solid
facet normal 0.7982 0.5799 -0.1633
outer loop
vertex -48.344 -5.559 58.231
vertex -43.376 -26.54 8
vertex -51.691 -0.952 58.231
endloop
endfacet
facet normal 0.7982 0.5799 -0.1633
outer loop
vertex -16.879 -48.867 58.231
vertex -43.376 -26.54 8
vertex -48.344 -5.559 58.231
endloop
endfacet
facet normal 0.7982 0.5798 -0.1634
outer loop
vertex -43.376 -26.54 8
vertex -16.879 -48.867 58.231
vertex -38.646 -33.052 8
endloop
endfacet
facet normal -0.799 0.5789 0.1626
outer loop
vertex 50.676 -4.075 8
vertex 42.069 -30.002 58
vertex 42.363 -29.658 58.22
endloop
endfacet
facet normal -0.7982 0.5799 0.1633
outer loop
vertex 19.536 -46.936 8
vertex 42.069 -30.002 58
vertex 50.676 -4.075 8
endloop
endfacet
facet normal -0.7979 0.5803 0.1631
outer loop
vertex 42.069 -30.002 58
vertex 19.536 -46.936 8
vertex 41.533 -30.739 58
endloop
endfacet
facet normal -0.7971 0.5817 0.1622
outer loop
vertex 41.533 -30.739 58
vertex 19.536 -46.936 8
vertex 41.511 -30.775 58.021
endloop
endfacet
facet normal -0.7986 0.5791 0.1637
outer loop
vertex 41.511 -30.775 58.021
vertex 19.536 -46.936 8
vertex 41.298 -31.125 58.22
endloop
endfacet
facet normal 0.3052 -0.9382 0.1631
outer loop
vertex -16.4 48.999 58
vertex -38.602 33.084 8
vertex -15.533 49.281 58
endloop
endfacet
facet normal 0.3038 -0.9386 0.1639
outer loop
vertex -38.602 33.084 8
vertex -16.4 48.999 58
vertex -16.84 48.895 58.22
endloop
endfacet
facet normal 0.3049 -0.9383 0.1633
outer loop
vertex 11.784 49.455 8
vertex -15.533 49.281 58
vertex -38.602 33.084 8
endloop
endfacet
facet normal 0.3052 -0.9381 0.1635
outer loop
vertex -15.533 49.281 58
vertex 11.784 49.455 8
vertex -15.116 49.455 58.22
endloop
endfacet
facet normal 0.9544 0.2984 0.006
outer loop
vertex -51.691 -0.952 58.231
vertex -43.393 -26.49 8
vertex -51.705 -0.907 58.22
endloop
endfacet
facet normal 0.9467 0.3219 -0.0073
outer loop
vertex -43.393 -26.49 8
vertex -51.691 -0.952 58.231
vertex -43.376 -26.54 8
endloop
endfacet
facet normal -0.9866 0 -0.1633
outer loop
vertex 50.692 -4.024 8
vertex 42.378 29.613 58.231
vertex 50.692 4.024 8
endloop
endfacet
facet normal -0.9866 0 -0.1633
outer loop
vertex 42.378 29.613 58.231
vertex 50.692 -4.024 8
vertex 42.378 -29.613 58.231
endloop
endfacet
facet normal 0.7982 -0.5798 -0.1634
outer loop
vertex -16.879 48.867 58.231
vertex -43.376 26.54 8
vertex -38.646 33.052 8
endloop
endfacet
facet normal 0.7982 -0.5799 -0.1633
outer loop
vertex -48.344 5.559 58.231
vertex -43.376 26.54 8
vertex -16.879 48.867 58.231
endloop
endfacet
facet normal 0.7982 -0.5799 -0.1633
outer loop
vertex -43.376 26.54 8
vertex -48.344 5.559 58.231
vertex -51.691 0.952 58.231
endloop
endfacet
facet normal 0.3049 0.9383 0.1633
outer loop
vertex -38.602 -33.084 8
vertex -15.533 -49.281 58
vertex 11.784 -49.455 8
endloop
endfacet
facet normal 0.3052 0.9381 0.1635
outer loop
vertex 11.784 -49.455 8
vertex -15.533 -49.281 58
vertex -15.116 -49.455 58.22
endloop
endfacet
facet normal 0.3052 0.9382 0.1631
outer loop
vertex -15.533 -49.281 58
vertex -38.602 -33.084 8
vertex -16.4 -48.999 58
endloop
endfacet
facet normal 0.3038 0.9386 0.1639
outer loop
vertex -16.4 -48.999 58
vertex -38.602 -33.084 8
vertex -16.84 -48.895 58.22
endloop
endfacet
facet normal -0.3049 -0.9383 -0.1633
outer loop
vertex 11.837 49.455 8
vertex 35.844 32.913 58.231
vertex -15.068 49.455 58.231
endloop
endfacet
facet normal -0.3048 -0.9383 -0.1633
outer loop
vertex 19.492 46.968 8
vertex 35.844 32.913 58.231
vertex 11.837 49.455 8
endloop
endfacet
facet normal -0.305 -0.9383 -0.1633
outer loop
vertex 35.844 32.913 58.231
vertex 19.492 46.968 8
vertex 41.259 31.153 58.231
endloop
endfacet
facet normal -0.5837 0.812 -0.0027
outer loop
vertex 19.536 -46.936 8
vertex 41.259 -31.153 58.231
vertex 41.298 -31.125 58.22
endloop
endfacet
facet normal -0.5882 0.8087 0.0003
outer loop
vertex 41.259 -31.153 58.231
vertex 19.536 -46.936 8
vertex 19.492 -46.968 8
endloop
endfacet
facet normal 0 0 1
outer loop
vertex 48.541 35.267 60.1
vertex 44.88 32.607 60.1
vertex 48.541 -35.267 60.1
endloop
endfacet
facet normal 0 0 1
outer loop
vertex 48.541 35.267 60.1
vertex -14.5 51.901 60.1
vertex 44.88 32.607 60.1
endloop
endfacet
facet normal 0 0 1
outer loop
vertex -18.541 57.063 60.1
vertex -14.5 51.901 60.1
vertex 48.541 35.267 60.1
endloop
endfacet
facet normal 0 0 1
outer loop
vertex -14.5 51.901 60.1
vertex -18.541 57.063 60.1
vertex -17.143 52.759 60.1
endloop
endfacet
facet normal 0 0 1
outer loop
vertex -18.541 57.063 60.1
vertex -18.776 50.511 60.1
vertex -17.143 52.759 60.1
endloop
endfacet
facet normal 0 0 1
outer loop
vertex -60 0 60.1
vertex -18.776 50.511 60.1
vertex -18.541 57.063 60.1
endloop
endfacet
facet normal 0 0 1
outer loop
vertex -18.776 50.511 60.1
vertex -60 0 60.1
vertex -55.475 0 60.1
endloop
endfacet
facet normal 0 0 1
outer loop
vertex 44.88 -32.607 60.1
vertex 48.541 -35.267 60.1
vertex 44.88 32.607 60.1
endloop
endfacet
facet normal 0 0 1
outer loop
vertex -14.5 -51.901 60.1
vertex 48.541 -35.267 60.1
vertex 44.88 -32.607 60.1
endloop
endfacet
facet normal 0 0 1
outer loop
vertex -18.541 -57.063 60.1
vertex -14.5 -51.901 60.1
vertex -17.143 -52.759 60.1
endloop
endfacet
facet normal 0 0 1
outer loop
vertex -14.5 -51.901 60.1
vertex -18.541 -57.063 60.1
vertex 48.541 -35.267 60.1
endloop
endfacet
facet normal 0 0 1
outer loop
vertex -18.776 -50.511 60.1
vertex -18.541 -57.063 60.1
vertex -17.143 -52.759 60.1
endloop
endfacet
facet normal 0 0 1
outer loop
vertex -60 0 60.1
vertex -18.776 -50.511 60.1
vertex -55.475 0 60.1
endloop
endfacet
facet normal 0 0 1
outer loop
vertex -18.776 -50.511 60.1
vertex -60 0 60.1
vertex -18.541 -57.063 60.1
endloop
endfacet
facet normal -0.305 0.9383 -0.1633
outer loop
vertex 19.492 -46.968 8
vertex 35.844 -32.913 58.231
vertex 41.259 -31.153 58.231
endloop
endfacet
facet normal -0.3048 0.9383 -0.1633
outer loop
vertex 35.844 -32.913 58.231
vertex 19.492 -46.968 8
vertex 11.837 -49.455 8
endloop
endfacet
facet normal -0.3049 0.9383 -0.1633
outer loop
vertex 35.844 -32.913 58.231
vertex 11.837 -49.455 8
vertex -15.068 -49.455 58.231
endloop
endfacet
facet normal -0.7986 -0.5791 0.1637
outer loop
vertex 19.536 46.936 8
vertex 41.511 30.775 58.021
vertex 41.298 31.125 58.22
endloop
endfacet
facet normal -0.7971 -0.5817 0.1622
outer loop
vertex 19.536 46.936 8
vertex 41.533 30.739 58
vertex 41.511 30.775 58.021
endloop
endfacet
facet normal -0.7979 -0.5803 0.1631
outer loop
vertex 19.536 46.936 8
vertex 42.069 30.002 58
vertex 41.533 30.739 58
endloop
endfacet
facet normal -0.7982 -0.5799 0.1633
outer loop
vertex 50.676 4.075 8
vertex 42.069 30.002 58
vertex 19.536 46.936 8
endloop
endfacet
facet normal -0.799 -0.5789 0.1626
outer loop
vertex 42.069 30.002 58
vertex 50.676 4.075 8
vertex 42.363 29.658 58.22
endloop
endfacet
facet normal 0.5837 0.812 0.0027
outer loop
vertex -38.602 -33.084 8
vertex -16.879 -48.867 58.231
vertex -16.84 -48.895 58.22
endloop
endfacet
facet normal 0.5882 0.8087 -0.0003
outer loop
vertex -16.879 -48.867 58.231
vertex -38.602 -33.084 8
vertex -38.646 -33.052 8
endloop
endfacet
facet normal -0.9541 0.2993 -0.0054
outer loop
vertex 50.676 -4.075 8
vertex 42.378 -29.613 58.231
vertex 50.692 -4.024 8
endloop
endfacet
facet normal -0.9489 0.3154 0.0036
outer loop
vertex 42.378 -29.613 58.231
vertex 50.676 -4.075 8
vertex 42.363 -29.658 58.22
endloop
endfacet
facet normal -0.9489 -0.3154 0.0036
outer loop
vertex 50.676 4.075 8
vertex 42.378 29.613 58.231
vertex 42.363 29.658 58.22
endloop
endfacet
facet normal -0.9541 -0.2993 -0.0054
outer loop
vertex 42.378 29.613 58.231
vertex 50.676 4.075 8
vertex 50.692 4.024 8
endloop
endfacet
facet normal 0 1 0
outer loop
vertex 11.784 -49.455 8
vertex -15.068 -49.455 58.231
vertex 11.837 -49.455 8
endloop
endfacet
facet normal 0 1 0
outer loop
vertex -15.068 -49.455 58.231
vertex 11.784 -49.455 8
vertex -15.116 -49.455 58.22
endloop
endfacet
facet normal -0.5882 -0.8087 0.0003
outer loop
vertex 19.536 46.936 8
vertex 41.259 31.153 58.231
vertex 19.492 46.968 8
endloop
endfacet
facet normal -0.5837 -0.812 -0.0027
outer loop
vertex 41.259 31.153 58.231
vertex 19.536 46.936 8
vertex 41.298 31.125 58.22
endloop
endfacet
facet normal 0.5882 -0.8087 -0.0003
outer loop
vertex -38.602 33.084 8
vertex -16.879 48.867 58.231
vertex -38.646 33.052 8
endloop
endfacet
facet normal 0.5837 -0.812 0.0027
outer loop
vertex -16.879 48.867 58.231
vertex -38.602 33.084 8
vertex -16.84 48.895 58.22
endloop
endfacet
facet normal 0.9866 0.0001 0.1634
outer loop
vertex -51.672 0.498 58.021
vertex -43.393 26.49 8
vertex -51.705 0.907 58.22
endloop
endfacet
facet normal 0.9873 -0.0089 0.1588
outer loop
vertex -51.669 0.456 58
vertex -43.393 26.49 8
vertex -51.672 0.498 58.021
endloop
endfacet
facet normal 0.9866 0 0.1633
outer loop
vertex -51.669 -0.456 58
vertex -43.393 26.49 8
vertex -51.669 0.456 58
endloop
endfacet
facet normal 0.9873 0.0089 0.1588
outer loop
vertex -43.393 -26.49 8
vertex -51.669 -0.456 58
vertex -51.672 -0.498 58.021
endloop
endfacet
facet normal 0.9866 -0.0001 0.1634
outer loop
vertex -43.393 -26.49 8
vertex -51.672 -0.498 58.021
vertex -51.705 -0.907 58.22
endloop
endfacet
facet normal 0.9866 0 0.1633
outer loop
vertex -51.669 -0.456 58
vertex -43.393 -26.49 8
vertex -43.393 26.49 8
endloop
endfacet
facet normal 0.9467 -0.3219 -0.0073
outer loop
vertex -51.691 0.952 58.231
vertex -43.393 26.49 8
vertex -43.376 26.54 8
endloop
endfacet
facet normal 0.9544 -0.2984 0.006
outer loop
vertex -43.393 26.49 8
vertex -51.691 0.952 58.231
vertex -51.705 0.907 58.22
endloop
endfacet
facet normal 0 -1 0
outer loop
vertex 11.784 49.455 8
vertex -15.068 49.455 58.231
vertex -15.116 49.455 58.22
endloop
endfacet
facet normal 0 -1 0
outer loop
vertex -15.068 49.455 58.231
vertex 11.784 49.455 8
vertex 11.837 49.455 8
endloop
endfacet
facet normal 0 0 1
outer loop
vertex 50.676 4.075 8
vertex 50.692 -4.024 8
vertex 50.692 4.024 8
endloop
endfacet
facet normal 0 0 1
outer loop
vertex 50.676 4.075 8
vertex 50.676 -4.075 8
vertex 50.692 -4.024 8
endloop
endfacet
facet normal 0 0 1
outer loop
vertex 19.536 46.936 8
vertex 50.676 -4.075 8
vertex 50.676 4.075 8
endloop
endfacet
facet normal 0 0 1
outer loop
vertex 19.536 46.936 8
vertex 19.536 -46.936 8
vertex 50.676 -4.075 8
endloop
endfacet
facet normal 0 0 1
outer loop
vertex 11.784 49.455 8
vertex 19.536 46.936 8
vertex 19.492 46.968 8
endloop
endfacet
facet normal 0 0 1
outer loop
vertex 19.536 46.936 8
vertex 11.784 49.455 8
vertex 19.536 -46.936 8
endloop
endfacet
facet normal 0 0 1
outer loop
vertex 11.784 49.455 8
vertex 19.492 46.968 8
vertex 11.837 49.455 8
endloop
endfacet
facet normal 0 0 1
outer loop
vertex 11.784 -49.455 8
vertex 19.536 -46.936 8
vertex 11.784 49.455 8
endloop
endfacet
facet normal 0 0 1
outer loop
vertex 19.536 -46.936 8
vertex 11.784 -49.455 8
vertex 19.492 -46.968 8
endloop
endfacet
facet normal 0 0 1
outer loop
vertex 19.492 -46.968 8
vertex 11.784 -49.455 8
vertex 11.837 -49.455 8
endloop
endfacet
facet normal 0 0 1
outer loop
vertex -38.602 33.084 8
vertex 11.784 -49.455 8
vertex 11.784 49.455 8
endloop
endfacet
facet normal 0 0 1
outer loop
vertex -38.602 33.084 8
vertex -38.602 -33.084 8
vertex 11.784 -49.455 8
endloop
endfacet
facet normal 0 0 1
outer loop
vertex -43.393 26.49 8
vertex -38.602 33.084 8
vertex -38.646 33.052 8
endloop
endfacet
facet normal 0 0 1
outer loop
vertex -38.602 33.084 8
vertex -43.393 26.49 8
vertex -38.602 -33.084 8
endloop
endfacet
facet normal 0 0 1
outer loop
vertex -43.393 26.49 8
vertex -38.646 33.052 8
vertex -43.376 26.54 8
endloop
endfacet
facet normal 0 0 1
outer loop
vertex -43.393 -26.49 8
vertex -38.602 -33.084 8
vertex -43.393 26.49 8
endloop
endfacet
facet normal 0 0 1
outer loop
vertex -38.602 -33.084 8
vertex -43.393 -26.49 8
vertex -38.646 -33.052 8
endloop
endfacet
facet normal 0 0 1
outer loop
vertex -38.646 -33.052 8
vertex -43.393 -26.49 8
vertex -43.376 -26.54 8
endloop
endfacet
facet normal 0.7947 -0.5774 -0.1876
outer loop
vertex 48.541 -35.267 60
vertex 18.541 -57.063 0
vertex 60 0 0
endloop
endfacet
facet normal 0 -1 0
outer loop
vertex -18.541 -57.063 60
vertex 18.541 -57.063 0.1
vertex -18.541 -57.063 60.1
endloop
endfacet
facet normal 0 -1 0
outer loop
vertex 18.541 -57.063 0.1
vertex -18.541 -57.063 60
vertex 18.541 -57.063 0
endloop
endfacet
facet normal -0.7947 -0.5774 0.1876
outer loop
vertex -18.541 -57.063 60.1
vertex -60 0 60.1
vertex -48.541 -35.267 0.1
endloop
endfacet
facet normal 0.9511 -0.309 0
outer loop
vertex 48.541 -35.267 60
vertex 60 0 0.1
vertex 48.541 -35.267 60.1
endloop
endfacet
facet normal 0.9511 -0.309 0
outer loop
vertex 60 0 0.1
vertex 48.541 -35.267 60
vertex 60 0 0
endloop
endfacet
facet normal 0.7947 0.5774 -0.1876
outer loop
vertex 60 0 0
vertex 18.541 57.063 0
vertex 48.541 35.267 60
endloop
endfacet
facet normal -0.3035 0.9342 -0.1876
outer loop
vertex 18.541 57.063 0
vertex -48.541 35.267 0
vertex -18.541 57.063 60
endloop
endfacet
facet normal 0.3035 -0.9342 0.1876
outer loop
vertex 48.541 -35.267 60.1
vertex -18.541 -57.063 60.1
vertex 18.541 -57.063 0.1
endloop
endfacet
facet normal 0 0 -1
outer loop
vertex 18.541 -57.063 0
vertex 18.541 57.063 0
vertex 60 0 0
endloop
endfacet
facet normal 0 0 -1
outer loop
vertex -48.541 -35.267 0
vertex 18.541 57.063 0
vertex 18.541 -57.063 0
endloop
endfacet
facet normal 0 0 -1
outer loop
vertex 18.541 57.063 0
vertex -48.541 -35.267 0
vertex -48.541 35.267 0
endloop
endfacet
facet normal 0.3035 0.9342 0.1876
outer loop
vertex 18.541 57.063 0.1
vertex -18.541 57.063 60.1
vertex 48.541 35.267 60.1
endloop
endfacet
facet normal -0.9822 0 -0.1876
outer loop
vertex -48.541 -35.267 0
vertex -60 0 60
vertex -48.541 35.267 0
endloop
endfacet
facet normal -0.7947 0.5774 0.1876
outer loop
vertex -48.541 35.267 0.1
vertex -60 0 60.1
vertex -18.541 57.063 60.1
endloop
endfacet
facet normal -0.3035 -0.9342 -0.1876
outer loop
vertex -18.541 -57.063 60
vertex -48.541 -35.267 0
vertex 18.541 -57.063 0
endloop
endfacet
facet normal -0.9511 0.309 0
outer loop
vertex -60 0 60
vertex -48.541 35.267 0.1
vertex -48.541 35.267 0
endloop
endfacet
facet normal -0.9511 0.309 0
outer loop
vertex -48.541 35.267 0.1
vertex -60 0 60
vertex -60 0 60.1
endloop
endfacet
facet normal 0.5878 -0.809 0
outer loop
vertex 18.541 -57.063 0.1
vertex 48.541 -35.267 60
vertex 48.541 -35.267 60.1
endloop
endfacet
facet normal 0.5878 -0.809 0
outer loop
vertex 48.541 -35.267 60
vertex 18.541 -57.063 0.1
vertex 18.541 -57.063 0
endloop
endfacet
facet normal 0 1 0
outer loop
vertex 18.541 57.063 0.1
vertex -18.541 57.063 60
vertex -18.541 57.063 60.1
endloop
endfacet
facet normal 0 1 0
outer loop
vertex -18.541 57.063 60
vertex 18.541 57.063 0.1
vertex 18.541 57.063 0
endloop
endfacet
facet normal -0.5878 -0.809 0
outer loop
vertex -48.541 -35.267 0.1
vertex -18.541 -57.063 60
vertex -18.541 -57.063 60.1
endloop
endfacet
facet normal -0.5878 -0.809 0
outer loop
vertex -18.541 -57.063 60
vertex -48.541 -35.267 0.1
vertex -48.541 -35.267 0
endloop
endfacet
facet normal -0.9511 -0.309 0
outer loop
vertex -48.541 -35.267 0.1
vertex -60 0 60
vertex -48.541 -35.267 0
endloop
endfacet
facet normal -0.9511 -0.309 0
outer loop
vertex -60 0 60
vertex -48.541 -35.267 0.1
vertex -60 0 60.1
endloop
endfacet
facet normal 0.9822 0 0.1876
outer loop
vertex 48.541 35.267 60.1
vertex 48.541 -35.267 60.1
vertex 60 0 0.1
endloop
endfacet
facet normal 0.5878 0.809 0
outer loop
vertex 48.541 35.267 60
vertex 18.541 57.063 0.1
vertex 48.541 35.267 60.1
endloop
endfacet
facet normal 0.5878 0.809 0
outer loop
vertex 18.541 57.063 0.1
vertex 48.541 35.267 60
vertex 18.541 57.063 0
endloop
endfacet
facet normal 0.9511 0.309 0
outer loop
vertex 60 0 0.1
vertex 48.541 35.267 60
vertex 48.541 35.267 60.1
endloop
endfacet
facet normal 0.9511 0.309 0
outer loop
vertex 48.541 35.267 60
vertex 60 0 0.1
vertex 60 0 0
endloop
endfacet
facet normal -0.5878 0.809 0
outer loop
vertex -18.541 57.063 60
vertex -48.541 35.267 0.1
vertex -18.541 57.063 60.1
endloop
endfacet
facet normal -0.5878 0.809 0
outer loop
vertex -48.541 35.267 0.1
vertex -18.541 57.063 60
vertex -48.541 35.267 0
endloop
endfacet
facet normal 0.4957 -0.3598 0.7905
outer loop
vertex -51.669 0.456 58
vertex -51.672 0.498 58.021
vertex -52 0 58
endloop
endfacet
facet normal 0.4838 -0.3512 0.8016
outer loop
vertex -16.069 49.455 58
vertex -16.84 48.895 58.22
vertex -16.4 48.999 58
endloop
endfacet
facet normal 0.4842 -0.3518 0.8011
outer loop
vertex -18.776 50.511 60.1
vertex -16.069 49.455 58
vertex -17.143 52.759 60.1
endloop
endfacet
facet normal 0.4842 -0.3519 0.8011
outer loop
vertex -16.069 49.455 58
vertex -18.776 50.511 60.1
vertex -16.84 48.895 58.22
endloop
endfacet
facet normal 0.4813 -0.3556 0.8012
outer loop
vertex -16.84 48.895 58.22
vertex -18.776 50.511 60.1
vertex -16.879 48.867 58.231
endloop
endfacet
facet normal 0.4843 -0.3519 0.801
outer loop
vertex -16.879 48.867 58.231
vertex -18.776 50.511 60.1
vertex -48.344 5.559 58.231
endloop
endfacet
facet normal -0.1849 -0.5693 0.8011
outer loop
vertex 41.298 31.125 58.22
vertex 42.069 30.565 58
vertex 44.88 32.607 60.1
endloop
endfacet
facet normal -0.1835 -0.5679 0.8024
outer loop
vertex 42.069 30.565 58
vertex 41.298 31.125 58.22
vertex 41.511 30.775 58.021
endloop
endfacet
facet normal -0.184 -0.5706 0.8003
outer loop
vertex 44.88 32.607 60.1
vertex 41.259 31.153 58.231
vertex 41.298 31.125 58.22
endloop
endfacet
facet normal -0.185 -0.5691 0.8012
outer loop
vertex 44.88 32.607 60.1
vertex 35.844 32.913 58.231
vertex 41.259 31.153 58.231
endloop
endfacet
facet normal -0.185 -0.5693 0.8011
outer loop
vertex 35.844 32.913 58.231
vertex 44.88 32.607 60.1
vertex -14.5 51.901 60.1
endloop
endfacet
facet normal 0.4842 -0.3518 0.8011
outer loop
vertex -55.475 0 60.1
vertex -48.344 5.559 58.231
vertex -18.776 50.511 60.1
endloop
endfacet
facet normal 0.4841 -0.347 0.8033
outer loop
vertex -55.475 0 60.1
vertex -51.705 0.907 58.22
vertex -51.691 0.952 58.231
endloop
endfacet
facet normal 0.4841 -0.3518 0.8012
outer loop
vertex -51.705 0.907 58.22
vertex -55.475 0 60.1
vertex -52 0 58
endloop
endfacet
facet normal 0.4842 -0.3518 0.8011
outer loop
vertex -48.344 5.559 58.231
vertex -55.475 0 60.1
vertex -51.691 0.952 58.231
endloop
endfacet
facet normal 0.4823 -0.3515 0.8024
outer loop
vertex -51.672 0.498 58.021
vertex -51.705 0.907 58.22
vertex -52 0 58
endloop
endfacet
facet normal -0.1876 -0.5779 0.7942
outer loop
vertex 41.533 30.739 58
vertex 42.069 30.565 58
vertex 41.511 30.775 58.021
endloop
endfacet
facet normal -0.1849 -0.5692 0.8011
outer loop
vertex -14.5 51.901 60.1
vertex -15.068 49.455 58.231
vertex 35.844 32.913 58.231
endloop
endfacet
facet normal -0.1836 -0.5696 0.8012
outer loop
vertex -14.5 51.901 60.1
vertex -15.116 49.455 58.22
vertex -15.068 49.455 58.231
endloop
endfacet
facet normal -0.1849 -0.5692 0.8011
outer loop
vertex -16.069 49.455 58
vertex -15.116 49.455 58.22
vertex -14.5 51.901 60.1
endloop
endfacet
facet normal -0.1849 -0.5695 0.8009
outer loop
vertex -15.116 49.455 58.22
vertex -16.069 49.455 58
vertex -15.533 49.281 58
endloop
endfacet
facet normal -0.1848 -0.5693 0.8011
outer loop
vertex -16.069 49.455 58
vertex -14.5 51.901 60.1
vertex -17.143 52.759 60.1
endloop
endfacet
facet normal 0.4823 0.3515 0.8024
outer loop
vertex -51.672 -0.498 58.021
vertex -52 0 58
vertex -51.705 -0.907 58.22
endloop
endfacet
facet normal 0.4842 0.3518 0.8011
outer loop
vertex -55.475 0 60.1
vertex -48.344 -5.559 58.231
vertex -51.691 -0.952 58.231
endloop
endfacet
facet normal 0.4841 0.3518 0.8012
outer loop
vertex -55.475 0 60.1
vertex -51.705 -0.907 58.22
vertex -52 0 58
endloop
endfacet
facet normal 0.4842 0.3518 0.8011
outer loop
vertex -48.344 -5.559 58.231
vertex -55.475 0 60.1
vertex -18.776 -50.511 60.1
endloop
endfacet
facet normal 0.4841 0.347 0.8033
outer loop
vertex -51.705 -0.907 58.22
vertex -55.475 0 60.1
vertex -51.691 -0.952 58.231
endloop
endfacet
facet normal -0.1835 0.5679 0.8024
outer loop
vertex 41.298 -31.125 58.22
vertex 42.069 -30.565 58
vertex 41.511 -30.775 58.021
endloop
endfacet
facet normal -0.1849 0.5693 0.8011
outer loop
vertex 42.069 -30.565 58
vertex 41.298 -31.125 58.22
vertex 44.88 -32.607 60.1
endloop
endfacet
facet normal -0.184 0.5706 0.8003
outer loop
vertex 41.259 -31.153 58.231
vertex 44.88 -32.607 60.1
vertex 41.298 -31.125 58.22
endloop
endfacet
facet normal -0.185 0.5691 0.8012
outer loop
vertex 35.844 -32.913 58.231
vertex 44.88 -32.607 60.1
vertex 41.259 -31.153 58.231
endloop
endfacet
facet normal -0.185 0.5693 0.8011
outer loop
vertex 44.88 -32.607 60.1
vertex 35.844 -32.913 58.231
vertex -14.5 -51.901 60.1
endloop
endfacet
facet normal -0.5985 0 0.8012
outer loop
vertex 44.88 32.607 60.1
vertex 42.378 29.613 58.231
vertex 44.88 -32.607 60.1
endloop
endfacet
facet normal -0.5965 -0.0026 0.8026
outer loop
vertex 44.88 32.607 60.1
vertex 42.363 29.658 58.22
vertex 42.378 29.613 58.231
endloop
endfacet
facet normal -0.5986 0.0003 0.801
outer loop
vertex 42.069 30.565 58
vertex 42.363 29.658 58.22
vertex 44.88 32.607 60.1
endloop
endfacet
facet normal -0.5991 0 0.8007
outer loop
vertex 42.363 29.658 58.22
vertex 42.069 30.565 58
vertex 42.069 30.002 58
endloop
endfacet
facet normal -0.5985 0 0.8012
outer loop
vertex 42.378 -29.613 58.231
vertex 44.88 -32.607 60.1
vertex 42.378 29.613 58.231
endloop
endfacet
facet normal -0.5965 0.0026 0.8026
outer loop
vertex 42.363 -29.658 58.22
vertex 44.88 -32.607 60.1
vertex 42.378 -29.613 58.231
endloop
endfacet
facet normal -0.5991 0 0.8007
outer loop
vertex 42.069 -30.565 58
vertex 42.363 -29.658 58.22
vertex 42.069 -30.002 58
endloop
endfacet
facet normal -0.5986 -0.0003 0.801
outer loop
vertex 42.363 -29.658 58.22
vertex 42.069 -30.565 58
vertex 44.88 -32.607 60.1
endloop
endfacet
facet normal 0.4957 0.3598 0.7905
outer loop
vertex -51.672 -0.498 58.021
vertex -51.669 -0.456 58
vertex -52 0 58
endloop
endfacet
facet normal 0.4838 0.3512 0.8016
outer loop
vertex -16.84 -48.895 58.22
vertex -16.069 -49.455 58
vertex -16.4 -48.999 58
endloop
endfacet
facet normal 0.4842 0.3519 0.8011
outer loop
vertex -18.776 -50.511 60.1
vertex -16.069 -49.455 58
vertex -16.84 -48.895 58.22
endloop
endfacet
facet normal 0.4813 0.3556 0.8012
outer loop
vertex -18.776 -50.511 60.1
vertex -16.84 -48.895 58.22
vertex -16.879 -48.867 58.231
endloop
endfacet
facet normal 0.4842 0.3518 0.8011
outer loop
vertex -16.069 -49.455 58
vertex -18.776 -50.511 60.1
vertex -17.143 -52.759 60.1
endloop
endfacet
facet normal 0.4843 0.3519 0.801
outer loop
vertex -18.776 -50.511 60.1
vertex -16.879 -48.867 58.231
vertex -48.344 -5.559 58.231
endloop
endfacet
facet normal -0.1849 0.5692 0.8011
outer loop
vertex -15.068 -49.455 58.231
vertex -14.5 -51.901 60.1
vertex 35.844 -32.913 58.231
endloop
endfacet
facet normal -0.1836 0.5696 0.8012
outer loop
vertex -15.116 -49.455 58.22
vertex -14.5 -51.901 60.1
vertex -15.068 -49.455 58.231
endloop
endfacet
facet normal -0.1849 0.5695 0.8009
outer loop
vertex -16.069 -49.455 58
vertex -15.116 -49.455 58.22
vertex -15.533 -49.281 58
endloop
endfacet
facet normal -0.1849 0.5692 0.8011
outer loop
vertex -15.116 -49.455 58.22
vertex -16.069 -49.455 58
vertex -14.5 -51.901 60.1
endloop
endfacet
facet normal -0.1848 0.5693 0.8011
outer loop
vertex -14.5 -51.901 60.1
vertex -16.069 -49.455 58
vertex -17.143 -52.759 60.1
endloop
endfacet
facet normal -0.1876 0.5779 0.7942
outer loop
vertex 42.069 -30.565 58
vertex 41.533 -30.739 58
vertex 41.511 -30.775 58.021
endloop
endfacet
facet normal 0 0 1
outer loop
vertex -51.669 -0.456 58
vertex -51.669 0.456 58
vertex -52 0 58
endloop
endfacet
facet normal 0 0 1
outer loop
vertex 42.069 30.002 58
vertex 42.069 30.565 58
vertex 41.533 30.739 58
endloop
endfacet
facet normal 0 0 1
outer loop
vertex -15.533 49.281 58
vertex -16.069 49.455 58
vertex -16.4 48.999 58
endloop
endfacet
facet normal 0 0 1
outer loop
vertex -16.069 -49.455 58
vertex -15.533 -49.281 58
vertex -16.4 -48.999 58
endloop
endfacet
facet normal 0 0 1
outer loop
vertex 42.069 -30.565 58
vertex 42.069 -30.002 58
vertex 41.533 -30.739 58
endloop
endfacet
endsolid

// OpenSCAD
outer_radius = 60;
height = outer_radius;
polygon_degree = 5;
thickness = 8;

module polygon_extrusion (height, degree, radius)
{
  hull () {
    linear_extrude (0.1)
      circle (radius, $fn=degree);
    translate ([0,0,height])
      linear_extrude (0.1)
        rotate ([0,0,180/polygon_degree])
          circle (radius, $fn=degree);
  }
}

linear_extrude (3) circle (3);

difference () {
  polygon_extrusion (
    height,
    polygon_degree,
    outer_radius);
  difference () {
    polygon_extrusion (
      height,
      polygon_degree,
      outer_radius - thickness);
    linear_extrude (thickness)
      circle (outer_radius * 2);
  }
  translate([0,0,height - 2])
    linear_extrude (2.2, scale=1.07)
      rotate ([0,0,180/polygon_degree])
        circle (outer_radius - thickness, $fn=polygon_degree);
}
